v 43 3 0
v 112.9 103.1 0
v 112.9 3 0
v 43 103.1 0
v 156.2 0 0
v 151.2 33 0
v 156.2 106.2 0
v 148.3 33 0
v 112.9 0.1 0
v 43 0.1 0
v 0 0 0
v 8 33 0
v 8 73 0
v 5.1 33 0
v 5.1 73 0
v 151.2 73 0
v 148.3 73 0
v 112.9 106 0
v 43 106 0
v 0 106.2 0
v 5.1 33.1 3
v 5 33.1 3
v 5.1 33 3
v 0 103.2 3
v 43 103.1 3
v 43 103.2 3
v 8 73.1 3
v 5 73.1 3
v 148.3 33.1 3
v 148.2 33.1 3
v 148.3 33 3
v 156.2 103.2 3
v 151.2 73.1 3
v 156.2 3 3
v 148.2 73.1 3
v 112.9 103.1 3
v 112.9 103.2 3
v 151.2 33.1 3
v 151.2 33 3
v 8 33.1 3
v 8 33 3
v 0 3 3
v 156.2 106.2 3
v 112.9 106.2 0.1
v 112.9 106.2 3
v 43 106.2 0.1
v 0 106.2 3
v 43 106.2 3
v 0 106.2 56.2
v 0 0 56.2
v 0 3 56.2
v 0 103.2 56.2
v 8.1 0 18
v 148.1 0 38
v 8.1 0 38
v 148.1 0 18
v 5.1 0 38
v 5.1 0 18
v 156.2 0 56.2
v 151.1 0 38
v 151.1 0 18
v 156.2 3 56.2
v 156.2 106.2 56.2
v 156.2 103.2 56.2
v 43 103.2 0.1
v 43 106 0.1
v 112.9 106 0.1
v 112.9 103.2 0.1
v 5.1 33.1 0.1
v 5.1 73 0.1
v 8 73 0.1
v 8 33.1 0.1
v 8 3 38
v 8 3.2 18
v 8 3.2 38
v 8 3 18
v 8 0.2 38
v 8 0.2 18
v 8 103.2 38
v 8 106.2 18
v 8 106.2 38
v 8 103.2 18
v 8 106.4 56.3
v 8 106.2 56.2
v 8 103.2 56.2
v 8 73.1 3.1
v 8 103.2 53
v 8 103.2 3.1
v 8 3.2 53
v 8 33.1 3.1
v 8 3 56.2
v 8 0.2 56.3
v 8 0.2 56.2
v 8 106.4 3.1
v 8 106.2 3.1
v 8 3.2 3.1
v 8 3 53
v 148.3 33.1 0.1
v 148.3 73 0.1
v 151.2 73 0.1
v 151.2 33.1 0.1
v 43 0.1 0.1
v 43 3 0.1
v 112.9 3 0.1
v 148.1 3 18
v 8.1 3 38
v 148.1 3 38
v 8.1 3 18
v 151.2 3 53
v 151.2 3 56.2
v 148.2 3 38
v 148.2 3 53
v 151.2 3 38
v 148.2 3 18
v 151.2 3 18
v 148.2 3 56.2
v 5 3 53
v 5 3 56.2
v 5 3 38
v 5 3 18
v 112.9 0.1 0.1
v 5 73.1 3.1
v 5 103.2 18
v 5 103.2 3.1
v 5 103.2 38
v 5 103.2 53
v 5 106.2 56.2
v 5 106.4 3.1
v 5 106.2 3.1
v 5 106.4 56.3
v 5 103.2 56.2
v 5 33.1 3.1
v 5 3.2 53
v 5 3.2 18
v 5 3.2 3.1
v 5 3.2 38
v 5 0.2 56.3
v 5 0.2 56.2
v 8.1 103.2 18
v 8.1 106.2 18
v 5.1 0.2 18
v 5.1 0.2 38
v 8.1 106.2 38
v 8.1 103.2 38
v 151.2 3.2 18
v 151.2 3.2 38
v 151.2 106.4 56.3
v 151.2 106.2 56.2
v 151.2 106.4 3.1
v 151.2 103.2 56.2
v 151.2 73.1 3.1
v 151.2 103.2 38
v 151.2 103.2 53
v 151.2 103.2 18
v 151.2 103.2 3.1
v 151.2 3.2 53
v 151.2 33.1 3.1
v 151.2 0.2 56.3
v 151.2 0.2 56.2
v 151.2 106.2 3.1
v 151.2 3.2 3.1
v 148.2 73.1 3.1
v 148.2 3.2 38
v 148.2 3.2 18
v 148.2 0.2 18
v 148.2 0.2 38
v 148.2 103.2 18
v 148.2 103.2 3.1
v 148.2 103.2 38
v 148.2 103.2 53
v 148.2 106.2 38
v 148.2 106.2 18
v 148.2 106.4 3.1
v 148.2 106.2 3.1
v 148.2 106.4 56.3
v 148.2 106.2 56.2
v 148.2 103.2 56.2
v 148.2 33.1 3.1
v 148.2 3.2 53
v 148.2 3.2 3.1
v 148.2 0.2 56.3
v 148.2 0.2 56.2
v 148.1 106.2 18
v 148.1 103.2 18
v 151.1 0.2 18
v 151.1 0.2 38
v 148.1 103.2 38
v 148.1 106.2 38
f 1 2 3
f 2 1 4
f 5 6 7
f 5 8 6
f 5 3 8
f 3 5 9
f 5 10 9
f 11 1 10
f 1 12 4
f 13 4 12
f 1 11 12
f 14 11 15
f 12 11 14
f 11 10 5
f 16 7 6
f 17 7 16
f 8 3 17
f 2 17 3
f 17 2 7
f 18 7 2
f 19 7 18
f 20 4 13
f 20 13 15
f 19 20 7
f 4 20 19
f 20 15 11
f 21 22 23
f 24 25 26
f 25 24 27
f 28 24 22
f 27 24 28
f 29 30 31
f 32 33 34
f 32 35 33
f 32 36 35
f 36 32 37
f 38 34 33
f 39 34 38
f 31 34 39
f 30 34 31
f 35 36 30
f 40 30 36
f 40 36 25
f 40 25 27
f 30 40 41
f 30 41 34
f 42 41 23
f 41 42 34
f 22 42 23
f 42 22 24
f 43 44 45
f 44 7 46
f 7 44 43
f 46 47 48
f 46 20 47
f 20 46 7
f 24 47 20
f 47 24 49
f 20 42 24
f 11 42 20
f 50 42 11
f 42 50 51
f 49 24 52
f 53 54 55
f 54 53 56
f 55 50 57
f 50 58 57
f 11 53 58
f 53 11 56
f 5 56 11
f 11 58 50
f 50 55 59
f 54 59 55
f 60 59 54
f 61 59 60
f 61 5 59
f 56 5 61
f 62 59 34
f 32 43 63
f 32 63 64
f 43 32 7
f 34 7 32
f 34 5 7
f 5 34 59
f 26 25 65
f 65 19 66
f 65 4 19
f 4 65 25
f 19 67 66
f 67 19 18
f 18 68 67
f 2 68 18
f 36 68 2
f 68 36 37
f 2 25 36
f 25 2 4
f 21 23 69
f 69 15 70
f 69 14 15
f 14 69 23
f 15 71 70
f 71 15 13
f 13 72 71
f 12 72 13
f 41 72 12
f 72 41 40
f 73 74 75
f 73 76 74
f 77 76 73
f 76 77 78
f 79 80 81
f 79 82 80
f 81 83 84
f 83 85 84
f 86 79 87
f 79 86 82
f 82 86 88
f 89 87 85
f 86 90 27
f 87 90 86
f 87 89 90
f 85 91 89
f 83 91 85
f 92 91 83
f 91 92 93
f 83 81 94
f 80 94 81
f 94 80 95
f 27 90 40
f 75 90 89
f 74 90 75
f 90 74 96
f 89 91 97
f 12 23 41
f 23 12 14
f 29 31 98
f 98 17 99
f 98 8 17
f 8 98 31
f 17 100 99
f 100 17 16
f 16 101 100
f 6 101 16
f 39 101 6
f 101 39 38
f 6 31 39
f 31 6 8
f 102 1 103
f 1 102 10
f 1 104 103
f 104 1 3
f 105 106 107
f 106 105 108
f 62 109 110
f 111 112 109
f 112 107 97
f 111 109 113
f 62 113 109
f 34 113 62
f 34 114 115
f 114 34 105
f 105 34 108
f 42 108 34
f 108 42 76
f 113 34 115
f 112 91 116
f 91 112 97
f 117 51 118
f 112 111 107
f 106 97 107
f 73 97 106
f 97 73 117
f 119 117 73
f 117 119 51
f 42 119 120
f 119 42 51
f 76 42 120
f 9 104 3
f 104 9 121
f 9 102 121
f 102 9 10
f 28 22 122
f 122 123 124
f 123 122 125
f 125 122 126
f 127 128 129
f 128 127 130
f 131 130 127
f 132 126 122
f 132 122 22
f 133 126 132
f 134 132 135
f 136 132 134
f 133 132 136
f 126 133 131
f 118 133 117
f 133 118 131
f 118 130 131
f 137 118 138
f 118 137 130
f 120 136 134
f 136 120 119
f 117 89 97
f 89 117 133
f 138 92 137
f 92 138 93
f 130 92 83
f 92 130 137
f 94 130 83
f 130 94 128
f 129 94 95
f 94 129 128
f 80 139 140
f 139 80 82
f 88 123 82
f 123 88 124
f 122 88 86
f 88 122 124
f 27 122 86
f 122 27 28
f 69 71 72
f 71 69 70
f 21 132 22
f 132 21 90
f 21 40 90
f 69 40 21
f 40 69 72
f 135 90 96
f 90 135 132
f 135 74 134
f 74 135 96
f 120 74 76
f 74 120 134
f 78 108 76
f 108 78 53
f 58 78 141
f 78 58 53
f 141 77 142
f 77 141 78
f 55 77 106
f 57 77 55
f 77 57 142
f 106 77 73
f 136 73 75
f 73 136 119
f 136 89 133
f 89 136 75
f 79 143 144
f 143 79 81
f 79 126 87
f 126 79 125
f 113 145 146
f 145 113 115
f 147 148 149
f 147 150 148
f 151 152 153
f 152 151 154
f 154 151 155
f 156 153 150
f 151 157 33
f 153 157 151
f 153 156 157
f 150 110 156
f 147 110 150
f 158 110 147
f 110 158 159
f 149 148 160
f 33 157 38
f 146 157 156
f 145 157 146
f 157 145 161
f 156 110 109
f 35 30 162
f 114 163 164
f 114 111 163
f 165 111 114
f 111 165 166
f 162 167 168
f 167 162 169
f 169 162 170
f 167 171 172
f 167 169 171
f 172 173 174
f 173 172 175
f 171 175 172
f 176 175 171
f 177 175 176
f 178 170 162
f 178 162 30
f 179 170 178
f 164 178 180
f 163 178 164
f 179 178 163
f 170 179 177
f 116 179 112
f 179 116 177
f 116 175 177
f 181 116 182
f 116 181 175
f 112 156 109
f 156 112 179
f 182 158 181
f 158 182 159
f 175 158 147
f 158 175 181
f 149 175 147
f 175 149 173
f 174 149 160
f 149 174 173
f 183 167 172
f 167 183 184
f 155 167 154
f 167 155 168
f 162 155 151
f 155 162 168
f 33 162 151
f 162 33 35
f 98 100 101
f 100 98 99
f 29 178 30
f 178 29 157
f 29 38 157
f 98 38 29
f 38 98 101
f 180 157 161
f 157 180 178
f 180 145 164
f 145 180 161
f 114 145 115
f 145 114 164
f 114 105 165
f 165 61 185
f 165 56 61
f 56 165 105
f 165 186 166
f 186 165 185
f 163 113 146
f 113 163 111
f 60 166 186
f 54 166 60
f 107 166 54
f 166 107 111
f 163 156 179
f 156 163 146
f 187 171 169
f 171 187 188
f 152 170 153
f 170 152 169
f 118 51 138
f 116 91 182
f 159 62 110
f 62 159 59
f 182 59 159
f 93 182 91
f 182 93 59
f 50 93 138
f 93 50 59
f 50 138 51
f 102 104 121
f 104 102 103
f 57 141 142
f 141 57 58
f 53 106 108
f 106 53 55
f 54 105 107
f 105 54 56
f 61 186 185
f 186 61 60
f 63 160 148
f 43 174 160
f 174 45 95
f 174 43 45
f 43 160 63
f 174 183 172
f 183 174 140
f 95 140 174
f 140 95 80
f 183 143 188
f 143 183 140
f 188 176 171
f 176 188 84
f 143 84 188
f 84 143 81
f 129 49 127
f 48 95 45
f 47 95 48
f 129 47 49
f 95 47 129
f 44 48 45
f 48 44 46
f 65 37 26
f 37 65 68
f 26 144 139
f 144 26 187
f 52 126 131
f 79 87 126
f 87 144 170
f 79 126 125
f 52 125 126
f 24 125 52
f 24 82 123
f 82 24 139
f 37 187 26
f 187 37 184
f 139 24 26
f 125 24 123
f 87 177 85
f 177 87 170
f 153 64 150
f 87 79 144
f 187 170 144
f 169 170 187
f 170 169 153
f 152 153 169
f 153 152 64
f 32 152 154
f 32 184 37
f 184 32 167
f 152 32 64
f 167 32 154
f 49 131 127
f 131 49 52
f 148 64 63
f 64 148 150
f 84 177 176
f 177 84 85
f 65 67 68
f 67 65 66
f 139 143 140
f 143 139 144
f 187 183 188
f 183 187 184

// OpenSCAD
// Manfacturing variables
inner_compensate = -0.1;
outter_compensate = 0.1;
board_thickness = 3;
box_padding = 5;

x_mortise_size = 70;
x_mortise_count = 1;

y_mortise_size = 40;
y_mortise_count = 1;

z_mortise_size = 20;
z_mortise_count = 1;

// Design variables.
box_inner_width = 140;
box_inner_length =100;
box_inner_height = 50;

// Automatic-calculated variables.
box_outter_width = box_inner_width + (box_padding + board_thickness + outter_compensate) * 2;
box_outter_length = box_inner_length + (board_thickness + outter_compensate) * 2;
box_outter_height = box_inner_height + (board_thickness + outter_compensate) * 2;

x_mortise_space = (box_inner_width - x_mortise_size * x_mortise_count) / (x_mortise_count + 1);
echo ("X Mortise Space => ", x_mortise_space);

y_mortise_space = box_inner_length / y_mortise_count - y_mortise_size;
echo ("Y Mortise Space => ", y_mortise_space);

z_mortise_space = (box_inner_height - z_mortise_size * z_mortise_count) / (z_mortise_count + 1);
echo ("Z Mortise Space => ", z_mortise_space);

// 建立底板
color("Brown")
linear_extrude(height = board_thickness)
	base_board();

// 建立左側板
color("Chocolate")
translate([box_padding + board_thickness, outter_compensate])
	rotate(-90, [0, 1, 0])
	linear_extrude(height = board_thickness)
	side_board();

// 建立右側板
color("Chocolate")
translate([box_outter_width - box_padding, outter_compensate])
	rotate(-90, [0, 1, 0])
	linear_extrude(height = board_thickness)
	side_board();

// 建立前面板
color("Orange")
translate([0, board_thickness])
	rotate(90, [1, 0, 0])
	linear_extrude(height = board_thickness)
	face_board();

// 建立後面板
color("Orange")
translate([0, box_outter_length])
	rotate(90, [1, 0, 0])
	linear_extrude(height = board_thickness)
	face_board();

/*
 *
 * Shape Modules
 *
 */

// 面板
module face_board() {
	union() {
		difference() {
			square(size = [box_outter_width, box_outter_height]);

			square(size = [box_outter_width, board_thickness]);
			for (y = [board_thickness + z_mortise_space : z_mortise_size + z_mortise_space : box_inner_height]) {
				translate([box_padding + outter_compensate, y])
					square(size = [board_thickness, z_mortise_size]);
				translate([box_outter_width - box_padding - board_thickness - outter_compensate, y])
					square(size = [board_thickness, z_mortise_size]);
			}
		}

		for (x = [x_mortise_space + board_thickness + box_padding : x_mortise_size + x_mortise_space : box_inner_width]) {
			echo("X => ", x);
			translate([x, outter_compensate])
				square(size = [x_mortise_size + inner_compensate, board_thickness + inner_compensate]);
		}
	}
}

// 側版
module side_board() {
	for (y = [y_mortise_space / 2 + board_thickness : y_mortise_size + y_mortise_space : box_outter_length]) {
		echo("Y => ", y);
		// 左邊榫溝
		translate([outter_compensate, y])
			square(size = [board_thickness + outter_compensate, y_mortise_size]);
	}

	difference() {
		translate([board_thickness + outter_compensate, outter_compensate])
			square(size = [box_outter_height - board_thickness, box_outter_length]);

		for (x = [board_thickness : z_mortise_size + z_mortise_space : box_outter_height]) {
			translate([x, outter_compensate])
				square(size = [z_mortise_space, board_thickness]);
			translate([x, box_outter_length - board_thickness - outter_compensate])
				square(size = [z_mortise_space, board_thickness]);
		}
	}
}

// 底板
module base_board() {
difference() {
	square(size = [box_outter_width, box_outter_length]);

	for (y = [y_mortise_space / 2 + board_thickness : y_mortise_size + y_mortise_space : box_outter_length]) {
		echo("Y => ", y);
		// 左邊榫溝
		translate([box_padding + outter_compensate, y])
			square(size = [board_thickness + inner_compensate, y_mortise_size]);
		// 右邊榫溝
		translate([box_outter_width + outter_compensate - box_padding - board_thickness, y])
			square(size = [board_thickness + inner_compensate, y_mortise_size]);
	}

	for (x = [x_mortise_space + board_thickness + box_padding : x_mortise_size + x_mortise_space : box_inner_width]) {
		echo("X => ", x);
		// 下邊榫溝
		translate([x, outter_compensate])
			square(size = [x_mortise_size + inner_compensate, board_thickness + inner_compensate]);
		// 上邊榫溝
		translate([x, box_outter_length - outter_compensate - board_thickness])
			square(size = [x_mortise_size + inner_compensate, board_thickness + inner_compensate]);
	}
}
}
